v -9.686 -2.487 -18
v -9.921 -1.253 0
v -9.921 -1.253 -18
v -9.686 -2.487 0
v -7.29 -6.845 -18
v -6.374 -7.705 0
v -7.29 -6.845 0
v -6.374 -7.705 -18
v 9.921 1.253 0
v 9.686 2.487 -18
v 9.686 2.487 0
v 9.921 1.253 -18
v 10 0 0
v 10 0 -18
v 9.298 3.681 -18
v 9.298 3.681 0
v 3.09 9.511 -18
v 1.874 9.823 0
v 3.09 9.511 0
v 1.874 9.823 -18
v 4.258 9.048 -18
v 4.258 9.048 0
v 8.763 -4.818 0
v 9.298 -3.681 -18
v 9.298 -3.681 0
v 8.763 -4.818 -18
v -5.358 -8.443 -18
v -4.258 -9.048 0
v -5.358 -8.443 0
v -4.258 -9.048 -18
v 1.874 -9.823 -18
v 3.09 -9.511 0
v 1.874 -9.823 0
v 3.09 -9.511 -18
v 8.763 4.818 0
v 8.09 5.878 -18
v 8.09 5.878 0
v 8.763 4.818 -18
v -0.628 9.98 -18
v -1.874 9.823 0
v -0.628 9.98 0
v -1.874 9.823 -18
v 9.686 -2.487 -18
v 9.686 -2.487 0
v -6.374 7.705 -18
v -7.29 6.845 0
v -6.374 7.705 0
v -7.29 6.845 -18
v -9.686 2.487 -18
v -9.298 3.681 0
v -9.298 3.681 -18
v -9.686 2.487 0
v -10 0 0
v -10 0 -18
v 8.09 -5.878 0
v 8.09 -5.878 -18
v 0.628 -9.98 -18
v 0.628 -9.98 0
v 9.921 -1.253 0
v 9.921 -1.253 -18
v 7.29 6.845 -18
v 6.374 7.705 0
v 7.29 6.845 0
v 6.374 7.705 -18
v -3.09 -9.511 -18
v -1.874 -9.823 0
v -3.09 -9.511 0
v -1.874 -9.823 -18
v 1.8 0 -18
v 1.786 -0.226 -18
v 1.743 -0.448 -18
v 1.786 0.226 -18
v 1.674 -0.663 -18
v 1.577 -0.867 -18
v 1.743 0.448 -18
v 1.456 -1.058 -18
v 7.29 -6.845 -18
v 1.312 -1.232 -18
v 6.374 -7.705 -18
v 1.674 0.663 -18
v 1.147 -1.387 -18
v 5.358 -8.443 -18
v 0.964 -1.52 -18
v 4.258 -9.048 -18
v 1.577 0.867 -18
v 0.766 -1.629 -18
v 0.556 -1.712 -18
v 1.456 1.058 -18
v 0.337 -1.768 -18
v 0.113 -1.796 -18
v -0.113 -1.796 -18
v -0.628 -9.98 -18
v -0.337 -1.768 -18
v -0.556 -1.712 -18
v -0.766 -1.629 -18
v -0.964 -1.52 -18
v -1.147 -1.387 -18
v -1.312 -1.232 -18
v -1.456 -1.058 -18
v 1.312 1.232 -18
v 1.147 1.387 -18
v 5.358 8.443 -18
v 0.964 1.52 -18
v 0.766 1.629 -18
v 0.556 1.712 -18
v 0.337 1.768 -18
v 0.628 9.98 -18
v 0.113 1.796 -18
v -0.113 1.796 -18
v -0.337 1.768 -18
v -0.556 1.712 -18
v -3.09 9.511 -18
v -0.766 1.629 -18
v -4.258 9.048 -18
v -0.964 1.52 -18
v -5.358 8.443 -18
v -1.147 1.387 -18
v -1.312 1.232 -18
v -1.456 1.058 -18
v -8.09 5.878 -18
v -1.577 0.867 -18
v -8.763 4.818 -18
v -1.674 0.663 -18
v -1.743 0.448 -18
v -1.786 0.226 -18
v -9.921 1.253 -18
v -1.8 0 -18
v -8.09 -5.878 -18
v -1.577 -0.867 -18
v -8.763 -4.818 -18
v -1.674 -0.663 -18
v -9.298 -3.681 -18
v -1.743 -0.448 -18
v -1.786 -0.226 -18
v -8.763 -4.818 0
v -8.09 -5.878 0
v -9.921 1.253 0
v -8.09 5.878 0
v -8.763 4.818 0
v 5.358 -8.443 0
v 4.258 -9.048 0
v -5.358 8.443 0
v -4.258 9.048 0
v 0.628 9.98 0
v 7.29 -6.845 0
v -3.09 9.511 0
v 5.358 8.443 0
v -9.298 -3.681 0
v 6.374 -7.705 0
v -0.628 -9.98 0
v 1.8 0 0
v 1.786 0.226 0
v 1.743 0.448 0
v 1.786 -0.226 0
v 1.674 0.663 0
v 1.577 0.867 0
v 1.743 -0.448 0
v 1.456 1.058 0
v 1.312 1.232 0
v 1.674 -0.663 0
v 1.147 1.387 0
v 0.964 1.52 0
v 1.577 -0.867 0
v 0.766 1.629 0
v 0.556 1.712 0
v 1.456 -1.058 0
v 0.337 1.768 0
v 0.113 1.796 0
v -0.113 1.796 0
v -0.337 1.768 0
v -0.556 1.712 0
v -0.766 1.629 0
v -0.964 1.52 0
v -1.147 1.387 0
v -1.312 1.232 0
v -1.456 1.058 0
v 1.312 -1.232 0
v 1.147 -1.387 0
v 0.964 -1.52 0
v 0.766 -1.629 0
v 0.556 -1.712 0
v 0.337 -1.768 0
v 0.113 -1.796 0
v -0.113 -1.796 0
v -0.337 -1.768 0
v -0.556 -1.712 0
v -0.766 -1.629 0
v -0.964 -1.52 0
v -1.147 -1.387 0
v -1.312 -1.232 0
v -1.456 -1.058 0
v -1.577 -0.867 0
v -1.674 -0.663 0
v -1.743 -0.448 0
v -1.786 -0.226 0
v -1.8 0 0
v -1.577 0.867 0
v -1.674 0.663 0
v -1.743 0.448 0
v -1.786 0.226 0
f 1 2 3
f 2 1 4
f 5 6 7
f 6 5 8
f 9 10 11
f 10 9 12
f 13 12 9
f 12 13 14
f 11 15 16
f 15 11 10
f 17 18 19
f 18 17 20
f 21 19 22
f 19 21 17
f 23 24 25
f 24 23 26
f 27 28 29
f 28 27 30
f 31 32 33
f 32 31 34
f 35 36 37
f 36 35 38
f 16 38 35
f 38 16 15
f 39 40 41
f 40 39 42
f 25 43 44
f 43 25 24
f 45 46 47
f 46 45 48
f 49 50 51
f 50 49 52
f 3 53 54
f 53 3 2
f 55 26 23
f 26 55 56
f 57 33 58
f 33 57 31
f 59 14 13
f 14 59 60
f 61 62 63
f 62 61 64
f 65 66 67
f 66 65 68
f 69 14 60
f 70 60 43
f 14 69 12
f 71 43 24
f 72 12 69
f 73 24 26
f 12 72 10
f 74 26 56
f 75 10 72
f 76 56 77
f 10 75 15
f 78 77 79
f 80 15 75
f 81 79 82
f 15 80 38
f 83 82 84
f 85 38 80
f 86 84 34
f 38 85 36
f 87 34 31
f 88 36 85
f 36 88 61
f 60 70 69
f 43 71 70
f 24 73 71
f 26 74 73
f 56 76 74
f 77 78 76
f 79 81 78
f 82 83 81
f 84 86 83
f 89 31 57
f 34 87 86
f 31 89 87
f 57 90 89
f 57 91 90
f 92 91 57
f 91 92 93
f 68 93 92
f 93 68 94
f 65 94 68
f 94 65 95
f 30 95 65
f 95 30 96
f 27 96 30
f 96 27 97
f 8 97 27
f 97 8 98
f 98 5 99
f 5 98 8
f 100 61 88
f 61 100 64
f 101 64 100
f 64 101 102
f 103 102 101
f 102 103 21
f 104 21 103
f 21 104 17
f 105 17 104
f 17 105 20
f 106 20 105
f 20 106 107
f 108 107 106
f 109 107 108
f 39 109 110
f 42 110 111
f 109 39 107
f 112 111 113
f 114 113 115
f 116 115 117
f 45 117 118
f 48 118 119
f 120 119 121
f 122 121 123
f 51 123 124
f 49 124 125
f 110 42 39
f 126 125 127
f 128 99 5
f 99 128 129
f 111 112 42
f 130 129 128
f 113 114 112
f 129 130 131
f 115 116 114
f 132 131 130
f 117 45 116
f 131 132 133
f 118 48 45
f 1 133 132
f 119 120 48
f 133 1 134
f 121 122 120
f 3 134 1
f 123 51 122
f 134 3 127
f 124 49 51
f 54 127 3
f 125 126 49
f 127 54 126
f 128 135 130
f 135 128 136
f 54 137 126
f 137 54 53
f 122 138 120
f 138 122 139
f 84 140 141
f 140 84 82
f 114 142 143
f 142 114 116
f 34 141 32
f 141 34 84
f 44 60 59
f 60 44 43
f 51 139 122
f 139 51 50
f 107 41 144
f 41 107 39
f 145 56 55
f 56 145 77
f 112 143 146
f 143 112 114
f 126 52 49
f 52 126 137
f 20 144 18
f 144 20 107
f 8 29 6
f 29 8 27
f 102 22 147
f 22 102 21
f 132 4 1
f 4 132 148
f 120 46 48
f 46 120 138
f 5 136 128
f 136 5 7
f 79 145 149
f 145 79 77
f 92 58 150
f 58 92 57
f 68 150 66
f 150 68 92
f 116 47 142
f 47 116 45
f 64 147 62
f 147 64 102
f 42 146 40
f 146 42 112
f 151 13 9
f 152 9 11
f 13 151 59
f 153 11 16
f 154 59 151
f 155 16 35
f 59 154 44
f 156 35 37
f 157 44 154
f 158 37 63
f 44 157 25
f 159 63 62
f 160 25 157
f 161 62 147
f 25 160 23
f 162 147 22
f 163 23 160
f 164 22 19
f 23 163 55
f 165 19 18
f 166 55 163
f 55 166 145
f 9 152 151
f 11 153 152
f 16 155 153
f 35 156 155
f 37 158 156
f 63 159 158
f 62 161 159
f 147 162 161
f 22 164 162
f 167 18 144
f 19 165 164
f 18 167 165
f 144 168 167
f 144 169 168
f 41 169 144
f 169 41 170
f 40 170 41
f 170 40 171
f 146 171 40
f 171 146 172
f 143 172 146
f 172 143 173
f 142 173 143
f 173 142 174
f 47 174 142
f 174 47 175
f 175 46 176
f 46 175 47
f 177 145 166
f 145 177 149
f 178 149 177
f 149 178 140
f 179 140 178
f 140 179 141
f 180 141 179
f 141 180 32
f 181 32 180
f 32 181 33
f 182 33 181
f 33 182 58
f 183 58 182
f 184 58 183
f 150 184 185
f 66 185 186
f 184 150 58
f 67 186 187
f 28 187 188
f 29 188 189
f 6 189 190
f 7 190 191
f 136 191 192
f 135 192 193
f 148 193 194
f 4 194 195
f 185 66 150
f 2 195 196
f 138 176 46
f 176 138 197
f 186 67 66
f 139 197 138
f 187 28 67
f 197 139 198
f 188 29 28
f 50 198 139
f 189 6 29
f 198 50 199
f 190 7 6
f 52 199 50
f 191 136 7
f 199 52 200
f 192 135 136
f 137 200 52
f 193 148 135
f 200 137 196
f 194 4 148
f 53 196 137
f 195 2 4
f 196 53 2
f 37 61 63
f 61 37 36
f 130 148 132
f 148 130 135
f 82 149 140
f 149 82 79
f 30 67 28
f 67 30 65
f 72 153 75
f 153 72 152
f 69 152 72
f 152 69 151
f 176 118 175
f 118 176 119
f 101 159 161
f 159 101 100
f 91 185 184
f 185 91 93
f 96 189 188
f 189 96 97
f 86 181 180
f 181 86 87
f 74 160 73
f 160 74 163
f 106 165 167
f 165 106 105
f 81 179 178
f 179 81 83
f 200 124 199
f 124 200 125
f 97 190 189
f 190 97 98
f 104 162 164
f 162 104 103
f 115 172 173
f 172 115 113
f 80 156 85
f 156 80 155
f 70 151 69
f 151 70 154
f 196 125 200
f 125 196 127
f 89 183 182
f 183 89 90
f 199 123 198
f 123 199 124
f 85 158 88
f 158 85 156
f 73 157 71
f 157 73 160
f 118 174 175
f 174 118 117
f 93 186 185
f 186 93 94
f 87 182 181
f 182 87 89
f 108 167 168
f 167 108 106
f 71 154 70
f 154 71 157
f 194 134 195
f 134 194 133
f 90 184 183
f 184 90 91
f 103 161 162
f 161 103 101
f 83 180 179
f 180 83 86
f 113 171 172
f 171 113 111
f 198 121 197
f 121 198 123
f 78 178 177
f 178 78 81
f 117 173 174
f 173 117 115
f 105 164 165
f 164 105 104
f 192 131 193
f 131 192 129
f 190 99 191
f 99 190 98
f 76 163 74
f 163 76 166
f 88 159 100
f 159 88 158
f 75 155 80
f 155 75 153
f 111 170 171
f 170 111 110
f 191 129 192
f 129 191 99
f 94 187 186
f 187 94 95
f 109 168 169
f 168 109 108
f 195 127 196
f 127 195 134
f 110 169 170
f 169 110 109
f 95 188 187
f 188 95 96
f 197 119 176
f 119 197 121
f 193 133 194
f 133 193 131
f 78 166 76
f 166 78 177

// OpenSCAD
$fn = 50;


difference() {
	union() {
		translate(v = [0, 0, -18.0000000000]) {
			cylinder(h = 18, r = 10.0000000000);
		}
		cylinder(h = 0, r = 16.0000000000);
	}
	union() {
		#translate(v = [0, 0, -18]) {
			cylinder(h = 18, r = 1.8000000000);
		}
	}
}
